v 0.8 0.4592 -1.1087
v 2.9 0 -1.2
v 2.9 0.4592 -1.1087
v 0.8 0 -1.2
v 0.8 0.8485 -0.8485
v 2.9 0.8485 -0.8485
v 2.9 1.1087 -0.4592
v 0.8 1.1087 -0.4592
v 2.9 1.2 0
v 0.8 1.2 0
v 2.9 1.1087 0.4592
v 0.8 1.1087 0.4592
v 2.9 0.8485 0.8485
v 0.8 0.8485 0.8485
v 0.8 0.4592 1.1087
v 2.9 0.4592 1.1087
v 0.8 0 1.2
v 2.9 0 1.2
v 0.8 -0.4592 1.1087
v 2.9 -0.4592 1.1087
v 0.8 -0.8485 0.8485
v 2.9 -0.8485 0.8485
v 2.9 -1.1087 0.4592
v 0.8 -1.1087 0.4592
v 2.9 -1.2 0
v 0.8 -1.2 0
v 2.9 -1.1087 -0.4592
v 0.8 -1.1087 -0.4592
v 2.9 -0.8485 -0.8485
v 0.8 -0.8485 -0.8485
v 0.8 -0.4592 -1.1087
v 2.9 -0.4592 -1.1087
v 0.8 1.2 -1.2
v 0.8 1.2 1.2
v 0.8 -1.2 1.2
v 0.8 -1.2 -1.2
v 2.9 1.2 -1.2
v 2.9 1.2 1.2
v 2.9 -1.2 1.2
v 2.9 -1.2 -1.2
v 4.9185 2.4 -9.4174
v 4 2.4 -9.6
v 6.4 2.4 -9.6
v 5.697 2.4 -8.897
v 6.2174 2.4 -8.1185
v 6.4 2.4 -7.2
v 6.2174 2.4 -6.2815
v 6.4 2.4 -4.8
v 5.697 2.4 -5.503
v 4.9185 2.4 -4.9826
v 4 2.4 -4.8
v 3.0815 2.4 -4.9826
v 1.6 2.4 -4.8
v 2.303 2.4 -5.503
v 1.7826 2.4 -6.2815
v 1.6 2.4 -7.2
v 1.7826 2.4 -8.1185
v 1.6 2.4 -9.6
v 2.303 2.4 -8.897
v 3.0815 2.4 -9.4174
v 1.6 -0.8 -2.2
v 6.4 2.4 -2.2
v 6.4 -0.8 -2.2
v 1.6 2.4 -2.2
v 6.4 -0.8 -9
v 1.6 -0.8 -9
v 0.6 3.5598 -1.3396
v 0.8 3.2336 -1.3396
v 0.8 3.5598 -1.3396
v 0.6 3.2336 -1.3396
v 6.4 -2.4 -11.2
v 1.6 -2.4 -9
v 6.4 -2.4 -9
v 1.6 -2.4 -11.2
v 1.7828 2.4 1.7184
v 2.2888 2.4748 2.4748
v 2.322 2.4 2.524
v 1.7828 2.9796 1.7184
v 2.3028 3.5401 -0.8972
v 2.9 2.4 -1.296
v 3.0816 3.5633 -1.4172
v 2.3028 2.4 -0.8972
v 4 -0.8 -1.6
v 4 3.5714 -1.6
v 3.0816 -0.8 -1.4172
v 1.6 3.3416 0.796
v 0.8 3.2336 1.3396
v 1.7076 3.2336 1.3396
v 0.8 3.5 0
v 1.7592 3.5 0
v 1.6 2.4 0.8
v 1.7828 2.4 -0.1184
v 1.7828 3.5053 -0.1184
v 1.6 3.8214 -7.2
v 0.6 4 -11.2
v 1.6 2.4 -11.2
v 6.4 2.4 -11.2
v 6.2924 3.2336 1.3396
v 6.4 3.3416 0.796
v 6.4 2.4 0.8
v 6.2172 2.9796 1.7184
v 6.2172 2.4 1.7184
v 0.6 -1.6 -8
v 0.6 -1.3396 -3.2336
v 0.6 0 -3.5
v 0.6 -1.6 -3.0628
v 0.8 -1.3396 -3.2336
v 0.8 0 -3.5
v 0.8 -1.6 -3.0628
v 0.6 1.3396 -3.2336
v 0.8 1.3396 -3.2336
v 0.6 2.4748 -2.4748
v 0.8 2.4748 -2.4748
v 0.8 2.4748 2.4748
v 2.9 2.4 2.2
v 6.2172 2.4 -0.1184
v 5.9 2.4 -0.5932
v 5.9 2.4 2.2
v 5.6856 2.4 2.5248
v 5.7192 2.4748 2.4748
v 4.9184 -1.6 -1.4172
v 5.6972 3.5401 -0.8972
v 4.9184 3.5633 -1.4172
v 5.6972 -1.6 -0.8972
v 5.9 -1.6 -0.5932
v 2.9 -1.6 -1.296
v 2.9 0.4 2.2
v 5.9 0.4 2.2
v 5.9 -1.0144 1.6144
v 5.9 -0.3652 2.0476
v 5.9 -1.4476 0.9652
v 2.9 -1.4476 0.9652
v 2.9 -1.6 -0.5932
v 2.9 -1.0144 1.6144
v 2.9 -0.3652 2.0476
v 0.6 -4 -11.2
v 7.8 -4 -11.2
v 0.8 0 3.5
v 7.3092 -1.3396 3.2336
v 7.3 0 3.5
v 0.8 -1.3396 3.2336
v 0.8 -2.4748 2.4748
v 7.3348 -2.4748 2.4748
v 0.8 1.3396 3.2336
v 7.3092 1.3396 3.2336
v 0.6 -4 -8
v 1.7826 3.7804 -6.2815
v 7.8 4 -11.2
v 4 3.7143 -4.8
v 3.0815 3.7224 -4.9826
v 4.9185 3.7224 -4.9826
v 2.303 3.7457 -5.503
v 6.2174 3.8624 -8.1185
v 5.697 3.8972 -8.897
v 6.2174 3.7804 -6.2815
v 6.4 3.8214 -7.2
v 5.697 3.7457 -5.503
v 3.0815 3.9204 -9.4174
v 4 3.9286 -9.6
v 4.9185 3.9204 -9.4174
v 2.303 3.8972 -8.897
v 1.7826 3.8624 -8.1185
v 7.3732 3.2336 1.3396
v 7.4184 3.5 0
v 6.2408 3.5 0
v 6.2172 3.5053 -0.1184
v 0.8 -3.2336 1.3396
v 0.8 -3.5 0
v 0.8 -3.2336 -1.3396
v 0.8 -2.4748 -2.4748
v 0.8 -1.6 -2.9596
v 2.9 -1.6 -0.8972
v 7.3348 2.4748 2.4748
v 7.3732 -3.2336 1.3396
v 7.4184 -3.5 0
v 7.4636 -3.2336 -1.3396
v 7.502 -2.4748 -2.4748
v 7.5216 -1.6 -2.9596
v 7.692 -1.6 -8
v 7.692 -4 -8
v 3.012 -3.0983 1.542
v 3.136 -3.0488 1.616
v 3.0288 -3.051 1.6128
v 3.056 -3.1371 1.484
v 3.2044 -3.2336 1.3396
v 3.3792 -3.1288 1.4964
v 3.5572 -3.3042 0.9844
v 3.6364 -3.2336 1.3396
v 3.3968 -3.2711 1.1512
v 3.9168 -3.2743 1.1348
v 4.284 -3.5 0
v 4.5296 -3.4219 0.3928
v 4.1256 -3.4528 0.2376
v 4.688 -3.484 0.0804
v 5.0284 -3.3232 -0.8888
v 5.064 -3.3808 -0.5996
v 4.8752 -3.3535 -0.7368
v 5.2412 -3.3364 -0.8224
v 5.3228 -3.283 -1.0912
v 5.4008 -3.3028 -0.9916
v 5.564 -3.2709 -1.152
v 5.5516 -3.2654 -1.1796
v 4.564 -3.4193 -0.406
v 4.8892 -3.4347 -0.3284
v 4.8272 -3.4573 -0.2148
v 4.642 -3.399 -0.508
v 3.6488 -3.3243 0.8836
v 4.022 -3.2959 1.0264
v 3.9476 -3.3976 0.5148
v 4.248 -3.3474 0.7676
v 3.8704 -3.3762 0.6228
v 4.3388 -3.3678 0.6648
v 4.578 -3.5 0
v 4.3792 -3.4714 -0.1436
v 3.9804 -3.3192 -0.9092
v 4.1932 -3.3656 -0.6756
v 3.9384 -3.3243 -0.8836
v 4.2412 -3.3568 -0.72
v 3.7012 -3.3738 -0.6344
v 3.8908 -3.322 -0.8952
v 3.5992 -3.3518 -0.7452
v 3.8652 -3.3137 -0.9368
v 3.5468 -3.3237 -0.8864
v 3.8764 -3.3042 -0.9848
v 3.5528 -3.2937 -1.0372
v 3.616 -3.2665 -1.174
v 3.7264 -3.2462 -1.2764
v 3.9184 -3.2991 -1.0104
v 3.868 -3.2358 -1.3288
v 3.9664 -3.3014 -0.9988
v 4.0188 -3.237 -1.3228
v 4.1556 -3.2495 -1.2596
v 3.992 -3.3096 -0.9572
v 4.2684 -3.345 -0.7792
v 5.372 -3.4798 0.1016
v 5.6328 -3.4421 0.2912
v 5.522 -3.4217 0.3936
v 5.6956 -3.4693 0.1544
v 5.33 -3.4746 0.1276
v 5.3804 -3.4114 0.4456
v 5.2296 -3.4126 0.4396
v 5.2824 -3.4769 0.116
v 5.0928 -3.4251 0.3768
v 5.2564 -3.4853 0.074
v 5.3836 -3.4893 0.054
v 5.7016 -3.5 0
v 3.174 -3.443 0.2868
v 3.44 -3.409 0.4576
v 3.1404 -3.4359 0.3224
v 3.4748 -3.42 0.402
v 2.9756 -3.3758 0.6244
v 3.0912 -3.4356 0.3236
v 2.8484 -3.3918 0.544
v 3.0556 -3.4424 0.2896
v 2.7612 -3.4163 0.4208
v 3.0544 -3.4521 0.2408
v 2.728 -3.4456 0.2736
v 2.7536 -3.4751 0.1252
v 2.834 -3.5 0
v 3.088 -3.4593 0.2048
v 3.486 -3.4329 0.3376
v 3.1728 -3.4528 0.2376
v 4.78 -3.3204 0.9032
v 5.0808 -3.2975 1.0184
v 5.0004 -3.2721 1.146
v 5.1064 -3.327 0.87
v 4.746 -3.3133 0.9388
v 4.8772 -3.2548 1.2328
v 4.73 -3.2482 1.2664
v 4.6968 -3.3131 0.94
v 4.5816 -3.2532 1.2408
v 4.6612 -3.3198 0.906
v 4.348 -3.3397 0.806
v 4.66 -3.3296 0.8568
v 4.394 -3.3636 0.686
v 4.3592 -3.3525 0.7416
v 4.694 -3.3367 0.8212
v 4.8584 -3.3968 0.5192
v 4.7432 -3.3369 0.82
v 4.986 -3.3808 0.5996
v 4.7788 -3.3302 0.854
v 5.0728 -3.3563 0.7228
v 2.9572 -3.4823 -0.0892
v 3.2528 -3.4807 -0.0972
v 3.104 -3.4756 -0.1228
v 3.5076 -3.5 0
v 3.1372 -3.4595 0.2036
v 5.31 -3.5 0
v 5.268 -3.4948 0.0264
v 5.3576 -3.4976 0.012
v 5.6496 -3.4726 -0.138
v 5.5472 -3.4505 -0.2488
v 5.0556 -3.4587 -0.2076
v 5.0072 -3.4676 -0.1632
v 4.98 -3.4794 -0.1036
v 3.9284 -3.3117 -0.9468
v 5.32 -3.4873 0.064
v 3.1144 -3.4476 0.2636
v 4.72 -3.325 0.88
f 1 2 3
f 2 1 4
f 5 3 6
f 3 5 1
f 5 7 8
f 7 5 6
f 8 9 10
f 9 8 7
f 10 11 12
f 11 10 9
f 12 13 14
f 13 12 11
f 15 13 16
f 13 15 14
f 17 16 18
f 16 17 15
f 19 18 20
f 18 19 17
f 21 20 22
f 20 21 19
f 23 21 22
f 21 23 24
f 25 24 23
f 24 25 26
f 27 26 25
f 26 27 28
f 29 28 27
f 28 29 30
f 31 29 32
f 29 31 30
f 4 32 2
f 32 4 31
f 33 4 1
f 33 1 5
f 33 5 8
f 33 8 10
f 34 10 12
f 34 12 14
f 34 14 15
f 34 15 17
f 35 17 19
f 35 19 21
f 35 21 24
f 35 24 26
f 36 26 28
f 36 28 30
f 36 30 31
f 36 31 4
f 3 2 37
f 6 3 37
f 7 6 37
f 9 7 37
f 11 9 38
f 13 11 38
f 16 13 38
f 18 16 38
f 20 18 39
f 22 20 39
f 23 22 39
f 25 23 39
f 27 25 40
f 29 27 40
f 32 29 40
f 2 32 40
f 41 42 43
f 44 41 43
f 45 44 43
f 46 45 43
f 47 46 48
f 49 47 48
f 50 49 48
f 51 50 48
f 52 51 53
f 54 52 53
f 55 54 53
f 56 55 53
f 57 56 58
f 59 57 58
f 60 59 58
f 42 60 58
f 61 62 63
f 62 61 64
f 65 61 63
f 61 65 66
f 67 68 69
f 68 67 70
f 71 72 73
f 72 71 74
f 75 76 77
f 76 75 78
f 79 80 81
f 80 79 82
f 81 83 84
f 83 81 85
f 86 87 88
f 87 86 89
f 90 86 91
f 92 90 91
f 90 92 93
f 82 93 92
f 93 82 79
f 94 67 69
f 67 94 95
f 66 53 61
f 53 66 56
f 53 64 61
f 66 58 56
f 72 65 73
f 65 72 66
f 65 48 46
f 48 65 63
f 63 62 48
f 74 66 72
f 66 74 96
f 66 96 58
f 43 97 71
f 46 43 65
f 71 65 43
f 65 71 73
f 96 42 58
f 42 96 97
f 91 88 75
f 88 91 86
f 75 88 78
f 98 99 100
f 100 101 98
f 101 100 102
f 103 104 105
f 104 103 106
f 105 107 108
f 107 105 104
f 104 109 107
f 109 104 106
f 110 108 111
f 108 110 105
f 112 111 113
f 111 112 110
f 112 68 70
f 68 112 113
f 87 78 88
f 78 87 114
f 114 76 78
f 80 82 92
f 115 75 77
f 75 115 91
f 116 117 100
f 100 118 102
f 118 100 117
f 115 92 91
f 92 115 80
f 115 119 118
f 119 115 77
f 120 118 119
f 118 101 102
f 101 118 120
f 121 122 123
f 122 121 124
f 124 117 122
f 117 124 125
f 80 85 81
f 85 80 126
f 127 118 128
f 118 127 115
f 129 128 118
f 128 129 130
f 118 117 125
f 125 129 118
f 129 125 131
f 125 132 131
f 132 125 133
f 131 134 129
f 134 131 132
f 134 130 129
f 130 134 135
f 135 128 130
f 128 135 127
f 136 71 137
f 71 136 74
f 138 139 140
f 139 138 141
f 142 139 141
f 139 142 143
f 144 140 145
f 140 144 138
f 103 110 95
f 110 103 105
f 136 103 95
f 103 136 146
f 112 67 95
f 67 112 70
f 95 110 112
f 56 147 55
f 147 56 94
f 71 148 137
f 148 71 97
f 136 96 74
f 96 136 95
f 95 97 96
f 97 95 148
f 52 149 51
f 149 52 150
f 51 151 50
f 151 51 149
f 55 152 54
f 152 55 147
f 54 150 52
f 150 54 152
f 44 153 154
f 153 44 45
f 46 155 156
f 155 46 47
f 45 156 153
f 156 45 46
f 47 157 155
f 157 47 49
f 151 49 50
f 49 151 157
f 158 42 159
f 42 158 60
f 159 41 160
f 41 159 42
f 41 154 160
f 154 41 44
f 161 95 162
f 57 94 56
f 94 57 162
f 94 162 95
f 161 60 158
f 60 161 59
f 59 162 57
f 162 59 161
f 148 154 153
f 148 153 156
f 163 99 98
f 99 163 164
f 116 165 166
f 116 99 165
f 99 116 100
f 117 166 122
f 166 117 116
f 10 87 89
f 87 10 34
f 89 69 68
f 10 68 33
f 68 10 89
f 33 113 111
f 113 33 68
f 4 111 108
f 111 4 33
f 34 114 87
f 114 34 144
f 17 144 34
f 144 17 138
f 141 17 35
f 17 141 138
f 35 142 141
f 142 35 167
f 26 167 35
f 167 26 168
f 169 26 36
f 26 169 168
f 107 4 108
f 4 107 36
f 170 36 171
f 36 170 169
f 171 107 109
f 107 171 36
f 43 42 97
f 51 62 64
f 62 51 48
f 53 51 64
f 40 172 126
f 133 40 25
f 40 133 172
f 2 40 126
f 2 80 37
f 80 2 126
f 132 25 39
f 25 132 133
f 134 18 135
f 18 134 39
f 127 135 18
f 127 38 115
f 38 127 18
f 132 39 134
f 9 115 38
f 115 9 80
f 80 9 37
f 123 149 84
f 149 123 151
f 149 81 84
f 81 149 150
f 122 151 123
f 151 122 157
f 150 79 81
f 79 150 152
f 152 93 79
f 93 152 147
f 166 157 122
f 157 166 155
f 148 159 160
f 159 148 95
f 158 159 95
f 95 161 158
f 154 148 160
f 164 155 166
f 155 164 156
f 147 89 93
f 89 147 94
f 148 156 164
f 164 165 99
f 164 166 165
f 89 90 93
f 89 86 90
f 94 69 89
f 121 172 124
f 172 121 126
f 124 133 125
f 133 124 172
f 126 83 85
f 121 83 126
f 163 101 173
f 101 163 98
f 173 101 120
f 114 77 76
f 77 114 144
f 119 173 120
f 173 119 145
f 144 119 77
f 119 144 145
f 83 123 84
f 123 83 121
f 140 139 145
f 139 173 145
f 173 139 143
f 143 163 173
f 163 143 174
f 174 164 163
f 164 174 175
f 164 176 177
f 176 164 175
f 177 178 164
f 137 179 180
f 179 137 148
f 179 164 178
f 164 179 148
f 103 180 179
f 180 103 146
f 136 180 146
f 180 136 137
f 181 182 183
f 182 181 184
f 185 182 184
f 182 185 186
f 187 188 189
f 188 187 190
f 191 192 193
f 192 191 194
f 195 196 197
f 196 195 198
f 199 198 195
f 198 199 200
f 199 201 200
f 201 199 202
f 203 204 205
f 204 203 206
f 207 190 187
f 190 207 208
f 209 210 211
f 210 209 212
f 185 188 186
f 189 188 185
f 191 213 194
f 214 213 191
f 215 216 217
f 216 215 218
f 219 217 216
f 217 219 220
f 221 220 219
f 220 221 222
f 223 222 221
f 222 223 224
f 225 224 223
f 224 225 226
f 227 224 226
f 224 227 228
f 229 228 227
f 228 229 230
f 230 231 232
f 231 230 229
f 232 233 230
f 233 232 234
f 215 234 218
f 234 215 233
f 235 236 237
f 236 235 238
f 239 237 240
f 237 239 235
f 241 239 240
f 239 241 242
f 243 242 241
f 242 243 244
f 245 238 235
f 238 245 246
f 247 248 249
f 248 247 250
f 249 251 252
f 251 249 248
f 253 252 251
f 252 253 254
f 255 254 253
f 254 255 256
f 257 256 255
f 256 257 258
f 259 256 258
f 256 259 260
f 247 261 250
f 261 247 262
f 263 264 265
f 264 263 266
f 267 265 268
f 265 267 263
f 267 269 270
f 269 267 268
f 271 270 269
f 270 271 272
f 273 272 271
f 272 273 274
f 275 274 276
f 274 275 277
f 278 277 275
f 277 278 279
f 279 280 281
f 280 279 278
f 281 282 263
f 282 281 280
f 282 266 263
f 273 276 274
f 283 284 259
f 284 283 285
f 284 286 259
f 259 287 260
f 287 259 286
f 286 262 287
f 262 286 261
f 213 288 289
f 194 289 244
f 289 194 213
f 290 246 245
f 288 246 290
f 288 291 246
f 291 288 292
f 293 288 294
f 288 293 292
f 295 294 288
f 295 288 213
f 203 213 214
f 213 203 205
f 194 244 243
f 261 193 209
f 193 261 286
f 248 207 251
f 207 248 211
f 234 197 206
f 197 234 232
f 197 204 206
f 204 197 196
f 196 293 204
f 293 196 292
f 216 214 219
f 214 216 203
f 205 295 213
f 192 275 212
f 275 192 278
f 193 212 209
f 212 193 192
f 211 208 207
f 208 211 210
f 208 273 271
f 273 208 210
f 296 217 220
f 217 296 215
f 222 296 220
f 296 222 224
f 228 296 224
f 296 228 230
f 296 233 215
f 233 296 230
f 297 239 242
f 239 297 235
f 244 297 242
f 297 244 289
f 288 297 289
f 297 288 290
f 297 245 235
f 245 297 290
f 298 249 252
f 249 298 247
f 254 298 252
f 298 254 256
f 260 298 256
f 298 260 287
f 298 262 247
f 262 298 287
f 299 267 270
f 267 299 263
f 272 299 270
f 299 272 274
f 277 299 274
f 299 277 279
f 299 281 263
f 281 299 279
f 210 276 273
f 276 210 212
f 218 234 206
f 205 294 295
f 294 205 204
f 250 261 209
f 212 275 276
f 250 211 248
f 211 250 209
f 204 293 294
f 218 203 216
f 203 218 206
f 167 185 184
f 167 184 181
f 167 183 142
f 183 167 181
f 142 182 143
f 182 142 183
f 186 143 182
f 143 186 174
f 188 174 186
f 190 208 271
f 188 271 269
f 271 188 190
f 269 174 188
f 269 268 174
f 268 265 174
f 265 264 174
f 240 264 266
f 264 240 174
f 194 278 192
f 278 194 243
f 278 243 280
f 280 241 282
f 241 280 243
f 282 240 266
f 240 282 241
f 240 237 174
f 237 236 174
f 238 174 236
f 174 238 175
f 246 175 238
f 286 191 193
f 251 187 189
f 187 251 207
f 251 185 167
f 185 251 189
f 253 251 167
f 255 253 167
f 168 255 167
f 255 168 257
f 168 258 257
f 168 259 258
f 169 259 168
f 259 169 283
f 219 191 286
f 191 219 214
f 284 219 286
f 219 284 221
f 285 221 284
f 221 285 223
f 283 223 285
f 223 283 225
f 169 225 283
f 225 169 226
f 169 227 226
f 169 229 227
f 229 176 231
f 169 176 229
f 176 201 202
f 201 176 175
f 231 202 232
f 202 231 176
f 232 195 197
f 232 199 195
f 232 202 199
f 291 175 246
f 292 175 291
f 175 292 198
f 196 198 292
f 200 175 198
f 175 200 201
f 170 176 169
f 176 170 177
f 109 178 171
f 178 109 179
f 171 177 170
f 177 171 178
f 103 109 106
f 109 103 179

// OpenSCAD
use <../lib.scad>
use <s/3817bs01.scad>
function ldraw_lib__3817bpc44() = [
// 0 ~Minifig Leg Left with  2 Safety Pins Pattern (Obsolete)
// 0 Name: 3817bpc44.dat
// 0 Author: Magnus Forsberg [MagFors]
// 0 !LDRAW_ORG Part UPDATE 2023-03
// 0 !LICENSE Licensed under CC BY 4.0 : see CAreadme.txt
// 
// 0 BFC CERTIFY CCW
  [0,"BFC","CERTIFY"],
  [0,"BFC","CCW"],
// 
// 0 !KEYWORDS bricklink 970c00pb0099, CMF, Punk Rocker, Rock Band Drummer
// 0 !KEYWORDS Series 4, set 850486
// 
// 0 !HISTORY 2013-12-23 [MagFors] Original design as 3817pc44
// 0 !HISTORY 2020-06-14 [MagFors] Adapted to corrected geometry
// 0 !HISTORY 2020-12-29 [PTadmin] Official Update 2020-03
// 0 !HISTORY 2023-06-03 [Holly-Wood] Obsoleted due to bad geometry
// 0 !HISTORY 2023-06-24 [OrionP] Official Update 2023-03
// 
// 
// 1 16 0 0 0 1 0 0 0 1 0 0 0 1 s\3817bs01.dat
  [1,16,0,0,0,1,0,0,0,1,0,0,0,1, ldraw_lib__s__3817bs01()],
// 4 16 1.5 20 -4 1.5 20 -10 19.23 20 -10 19.23 20 -4
  [4,16,1.5,20,-4,1.5,20,-10,19.23,20,-10,19.23,20,-4],
// 4 16 1.5 20 -10 1.5 28 -10 19.5 28 -10 19.23 20 -10
  [4,16,1.5,20,-10,1.5,28,-10,19.5,28,-10,19.23,20,-10],
// 5 24 2 3.349 -8.084 18.659 3.349 -8.084 2 0 -8.75 2 6.187 -6.187
  [5,24,2,3.349,-8.084,18.659,3.349,-8.084,2,0,-8.75,2,6.187,-6.187],
// 5 24 2 6.187 -6.187 18.755 6.187 -6.187 2 7.399 -4 2 3.349 -8.084
  [5,24,2,6.187,-6.187,18.755,6.187,-6.187,2,7.399,-4,2,3.349,-8.084],
// 5 24 2 0 -8.75 18.546 0 -8.75 2 3.349 -8.084 2 -3.349 -8.084
  [5,24,2,0,-8.75,18.546,0,-8.75,2,3.349,-8.084,2,-3.349,-8.084],
// 5 24 2 -3.349 -8.084 18.433 -3.349 -8.084 2 0 -8.75 2 -6.187 -6.187
  [5,24,2,-3.349,-8.084,18.433,-3.349,-8.084,2,0,-8.75,2,-6.187,-6.187],
// 
// 4 0 7.84 -4.04 -7.6221 7.572 -4.032 -7.6275 7.53 -3.855 -7.7458 7.64 -3.71 -7.8427
  [4,0,7.84,-4.04,-7.6221,7.572,-4.032,-7.6275,7.53,-3.855,-7.7458,7.64,-3.71,-7.8427],
// 4 0 7.64 -3.71 -7.8427 8.011 -3.349 -8.084 8.448 -3.741 -7.822 7.84 -4.04 -7.6221
  [4,0,7.64,-3.71,-7.8427,8.011,-3.349,-8.084,8.448,-3.741,-7.822,7.84,-4.04,-7.6221],
// 4 0 9.792 -2.837 -8.1858 9.091 -3.349 -8.084 8.492 -2.878 -8.1777 8.893 -2.461 -8.2606
  [4,0,9.792,-2.837,-8.1858,9.091,-3.349,-8.084,8.492,-2.878,-8.1777,8.893,-2.461,-8.2606],
// 4 0 11.72 -0.201 -8.71 11.324 -0.982 -8.5547 10.314 -0.594 -8.6319 10.71 0 -8.75
  [4,0,11.72,-0.201,-8.71,11.324,-0.982,-8.5547,10.314,-0.594,-8.6319,10.71,0,-8.75],
// 4 0 13.103 2.056 -8.3411 12.66 1.499 -8.4519 12.188 1.842 -8.3837 12.571 2.222 -8.3081
  [4,0,13.103,2.056,-8.3411,12.66,1.499,-8.4519,12.188,1.842,-8.3837,12.571,2.222,-8.3081],
// 4 0 13.502 2.479 -8.257 13.103 2.056 -8.3411 12.571 2.222 -8.3081 13.307 2.728 -8.2075
  [4,0,13.502,2.479,-8.257,13.103,2.056,-8.3411,12.571,2.222,-8.3081,13.307,2.728,-8.2075],
// 4 0 13.502 2.479 -8.257 13.307 2.728 -8.2075 13.879 2.949 -8.1635 13.91 2.88 -8.1773
  [4,0,13.502,2.479,-8.257,13.307,2.728,-8.2075,13.879,2.949,-8.1635,13.91,2.88,-8.1773],
// 4 0 11.41 1.015 -8.5482 11.605 1.27 -8.4974 12.223 0.821 -8.5867 12.068 0.537 -8.6432
  [4,0,11.41,1.015,-8.5482,11.605,1.27,-8.4974,12.223,0.821,-8.5867,12.068,0.537,-8.6432],
// 4 0 10.055 -2.566 -8.2397 9.792 -2.837 -8.1858 8.893 -2.461 -8.2606 9.122 -2.209 -8.3107
  [4,0,10.055,-2.566,-8.2397,9.792,-2.837,-8.1858,8.893,-2.461,-8.2606,9.122,-2.209,-8.3107],
// 4 0 9.869 -1.287 -8.4941 10.847 -1.662 -8.4195 10.62 -1.919 -8.3684 9.676 -1.557 -8.4404
  [4,0,9.869,-1.287,-8.4941,10.847,-1.662,-8.4195,10.62,-1.919,-8.3684,9.676,-1.557,-8.4404],
// 3 0 8.011 -3.349 -8.084 9.091 -3.349 -8.084 8.448 -3.741 -7.822
  [3,0,8.011,-3.349,-8.084,9.091,-3.349,-8.084,8.448,-3.741,-7.822],
// 3 0 8.492 -2.878 -8.1777 9.091 -3.349 -8.084 8.011 -3.349 -8.084
  [3,0,8.492,-2.878,-8.1777,9.091,-3.349,-8.084,8.011,-3.349,-8.084],
// 3 0 10.71 0 -8.75 11.445 0 -8.75 11.72 -0.201 -8.71
  [3,0,10.71,0,-8.75,11.445,0,-8.75,11.72,-0.201,-8.71],
// 3 0 10.948 0.359 -8.6786 11.445 0 -8.75 10.71 0 -8.75
  [3,0,10.948,0.359,-8.6786,11.445,0,-8.75,10.71,0,-8.75],
// 4 80 10.603 1.8 -8.392 10.483 1.689 -8.4141 9.846 2.209 -8.3107 9.951 2.273 -8.298
  [4,80,10.603,1.8,-8.392,10.483,1.689,-8.4141,9.846,2.209,-8.3107,9.951,2.273,-8.298],
// 4 80 9.253 1.586 -8.4346 9.727 2.238 -8.3049 9.846 2.209 -8.3107 10.483 1.689 -8.4141
  [4,80,9.253,1.586,-8.4346,9.727,2.238,-8.3049,9.846,2.209,-8.3107,10.483,1.689,-8.4141],
// 4 80 9.663 2.342 -8.2843 9.727 2.238 -8.3049 9.253 1.586 -8.4346 8.998 1.863 -8.3795
  [4,80,9.663,2.342,-8.2843,9.727,2.238,-8.3049,9.253,1.586,-8.4346,8.998,1.863,-8.3795],
// 4 80 9.691 2.462 -8.2604 9.663 2.342 -8.2843 8.998 1.863 -8.3795 8.867 2.216 -8.3093
  [4,80,9.691,2.462,-8.2604,9.663,2.342,-8.2843,8.998,1.863,-8.3795,8.867,2.216,-8.3093],
// 4 80 9.04 2.935 -8.1663 9.691 2.462 -8.2604 8.867 2.216 -8.3093 8.882 2.593 -8.2343
  [4,80,9.04,2.935,-8.1663,9.691,2.462,-8.2604,8.867,2.216,-8.3093,8.882,2.593,-8.2343],
// 4 80 9.796 2.526 -8.2477 9.691 2.462 -8.2604 9.04 2.935 -8.1663 9.316 3.191 -8.1154
  [4,80,9.796,2.526,-8.2477,9.691,2.462,-8.2604,9.04,2.935,-8.1663,9.316,3.191,-8.1154],
// 4 80 9.916 2.497 -8.2534 9.796 2.526 -8.2477 9.316 3.191 -8.1154 9.67 3.322 -8.0894
  [4,80,9.916,2.497,-8.2534,9.796,2.526,-8.2477,9.316,3.191,-8.1154,9.67,3.322,-8.0894],
// 4 80 10.389 3.149 -8.1238 9.916 2.497 -8.2534 9.67 3.322 -8.0894 10.047 3.307 -8.0924
  [4,80,10.389,3.149,-8.1238,9.916,2.497,-8.2534,9.67,3.322,-8.0894,10.047,3.307,-8.0924],
// 4 80 10.671 1.948 -8.3626 9.98 2.393 -8.2741 9.916 2.497 -8.2534 10.389 3.149 -8.1238
  [4,80,10.671,1.948,-8.3626,9.98,2.393,-8.2741,9.916,2.497,-8.2534,10.389,3.149,-8.1238],
// 4 80 10.603 1.8 -8.392 9.951 2.273 -8.298 9.98 2.393 -8.2741 10.671 1.948 -8.3626
  [4,80,10.603,1.8,-8.392,9.951,2.273,-8.298,9.98,2.393,-8.2741,10.671,1.948,-8.3626],
// 4 80 13.805 -0.984 -8.5543 13.43 -0.254 -8.6995 14.239 -0.386 -8.6732 14.082 -0.728 -8.6052
  [4,80,13.805,-0.984,-8.5543,13.43,-0.254,-8.6995,14.239,-0.386,-8.6732,14.082,-0.728,-8.6052],
// 4 80 13.451 -1.114 -8.5285 13.325 -0.319 -8.6866 13.43 -0.254 -8.6995 13.805 -0.984 -8.5543
  [4,80,13.451,-1.114,-8.5285,13.325,-0.319,-8.6866,13.43,-0.254,-8.6995,13.805,-0.984,-8.5543],
// 4 80 13.074 -1.099 -8.5314 13.206 -0.29 -8.6923 13.325 -0.319 -8.6866 13.451 -1.114 -8.5285
  [4,80,13.074,-1.099,-8.5314,13.206,-0.29,-8.6923,13.325,-0.319,-8.6866,13.451,-1.114,-8.5285],
// 4 80 13.141 -0.185 -8.7132 13.206 -0.29 -8.6923 13.074 -1.099 -8.5314 12.732 -0.942 -8.5627
  [4,80,13.141,-0.185,-8.7132,13.206,-0.29,-8.6923,13.074,-1.099,-8.5314,12.732,-0.942,-8.5627],
// 4 80 14.239 -0.386 -8.6732 13.43 -0.254 -8.6995 13.459 -0.135 -8.7232 14.254 0 -8.75
  [4,80,14.239,-0.386,-8.6732,13.43,-0.254,-8.6995,13.459,-0.135,-8.7232,14.254,0,-8.75],
// 4 80 8.687 -1.005 -8.5501 8.6 -1.144 -8.5225 7.851 -0.806 -8.5897 7.935 -0.717 -8.6074
  [4,80,8.687,-1.005,-8.5501,8.6,-1.144,-8.5225,7.851,-0.806,-8.5897,7.935,-0.717,-8.6074],
// 4 80 7.439 -1.561 -8.4396 7.728 -0.809 -8.5891 7.851 -0.806 -8.5897 8.6 -1.144 -8.5225
  [4,80,7.439,-1.561,-8.4396,7.728,-0.809,-8.5891,7.851,-0.806,-8.5897,8.6,-1.144,-8.5225],
// 4 80 7.639 -0.724 -8.606 7.728 -0.809 -8.5891 7.439 -1.561 -8.4396 7.121 -1.36 -8.4795
  [4,80,7.639,-0.724,-8.606,7.728,-0.809,-8.5891,7.439,-1.561,-8.4396,7.121,-1.36,-8.4795],
// 4 80 7.636 -0.602 -8.6303 7.639 -0.724 -8.606 7.121 -1.36 -8.4795 6.903 -1.052 -8.5408
  [4,80,7.636,-0.602,-8.6303,7.639,-0.724,-8.606,7.121,-1.36,-8.4795,6.903,-1.052,-8.5408],
// 4 80 6.884 -0.313 -8.6878 7.636 -0.602 -8.6303 6.903 -1.052 -8.5408 6.82 -0.684 -8.614
  [4,80,6.884,-0.313,-8.6878,7.636,-0.602,-8.6303,6.903,-1.052,-8.5408,6.82,-0.684,-8.614],
// 4 80 7.72 -0.512 -8.6482 7.636 -0.602 -8.6303 6.884 -0.313 -8.6878 7.085 0 -8.75
  [4,80,7.72,-0.512,-8.6482,7.636,-0.602,-8.6303,6.884,-0.313,-8.6878,7.085,0,-8.75],
// 4 80 8.687 -1.005 -8.5501 7.935 -0.717 -8.6074 7.932 -0.594 -8.6319 8.715 -0.844 -8.5822
  [4,80,8.687,-1.005,-8.5501,7.935,-0.717,-8.6074,7.932,-0.594,-8.6319,8.715,-0.844,-8.5822],
// 4 80 12.501 -2.865 -8.1803 11.95 -2.258 -8.301 12.766 -2.175 -8.3175 12.702 -2.546 -8.2437
  [4,80,12.501,-2.865,-8.1803,11.95,-2.258,-8.301,12.766,-2.175,-8.3175,12.702,-2.546,-8.2437],
// 4 80 12.193 -3.082 -8.1371 11.865 -2.347 -8.2833 11.95 -2.258 -8.301 12.501 -2.865 -8.1803
  [4,80,12.193,-3.082,-8.1371,11.865,-2.347,-8.2833,11.95,-2.258,-8.301,12.501,-2.865,-8.1803],
// 4 80 11.825 -3.166 -8.1204 11.742 -2.35 -8.2827 11.865 -2.347 -8.2833 12.193 -3.082 -8.1371
  [4,80,11.825,-3.166,-8.1204,11.742,-2.35,-8.2827,11.865,-2.347,-8.2833,12.193,-3.082,-8.1371],
// 4 80 11.653 -2.265 -8.2996 11.742 -2.35 -8.2827 11.825 -3.166 -8.1204 11.454 -3.102 -8.1331
  [4,80,11.653,-2.265,-8.2996,11.742,-2.35,-8.2827,11.825,-3.166,-8.1204,11.454,-3.102,-8.1331],
// 4 80 11.65 -2.142 -8.324 11.653 -2.265 -8.2996 11.454 -3.102 -8.1331 10.87 -2.015 -8.3493
  [4,80,11.65,-2.142,-8.324,11.653,-2.265,-8.2996,11.454,-3.102,-8.1331,10.87,-2.015,-8.3493],
// 4 80 10.898 -1.854 -8.3813 10.985 -1.715 -8.4089 11.735 -2.053 -8.3417 11.65 -2.142 -8.324
  [4,80,10.898,-1.854,-8.3813,10.985,-1.715,-8.4089,11.735,-2.053,-8.3417,11.65,-2.142,-8.324],
// 4 80 12.146 -1.298 -8.4919 11.858 -2.05 -8.3423 11.735 -2.053 -8.3417 10.985 -1.715 -8.4089
  [4,80,12.146,-1.298,-8.4919,11.858,-2.05,-8.3423,11.735,-2.053,-8.3417,10.985,-1.715,-8.4089],
// 4 80 11.947 -2.135 -8.3254 11.858 -2.05 -8.3423 12.146 -1.298 -8.4919 12.465 -1.499 -8.4519
  [4,80,11.947,-2.135,-8.3254,11.858,-2.05,-8.3423,12.146,-1.298,-8.4919,12.465,-1.499,-8.4519],
// 4 80 11.95 -2.258 -8.301 11.947 -2.135 -8.3254 12.465 -1.499 -8.4519 12.682 -1.807 -8.3907
  [4,80,11.95,-2.258,-8.301,11.947,-2.135,-8.3254,12.465,-1.499,-8.4519,12.682,-1.807,-8.3907],
// 3 80 12.682 -1.807 -8.3907 12.766 -2.175 -8.3175 11.95 -2.258 -8.301
  [3,80,12.682,-1.807,-8.3907,12.766,-2.175,-8.3175,11.95,-2.258,-8.301],
// 3 80 10.87 -2.015 -8.3493 10.898 -1.854 -8.3813 11.65 -2.142 -8.324
  [3,80,10.87,-2.015,-8.3493,10.898,-1.854,-8.3813,11.65,-2.142,-8.324],
// 4 80 8.132 0.243 -8.7017 7.085 0 -8.75 7.393 0.223 -8.7057 7.76 0.307 -8.6889
  [4,80,8.132,0.243,-8.7017,7.085,0,-8.75,7.393,0.223,-8.7057,7.76,0.307,-8.6889],
// 3 80 8.132 0.243 -8.7017 8.769 0 -8.75 7.085 0 -8.75
  [3,80,8.132,0.243,-8.7017,8.769,0,-8.75,7.085,0,-8.75],
// 4 80 8.769 0 -8.75 7.843 -0.509 -8.6488 7.72 -0.512 -8.6482 7.085 0 -8.75
  [4,80,8.769,0,-8.75,7.843,-0.509,-8.6488,7.72,-0.512,-8.6482,7.085,0,-8.75],
// 4 80 8.715 -0.844 -8.5822 7.932 -0.594 -8.6319 7.843 -0.509 -8.6488 8.769 0 -8.75
  [4,80,8.715,-0.844,-8.5822,7.932,-0.594,-8.6319,7.843,-0.509,-8.6488,8.769,0,-8.75],
// 3 80 11.445 0 -8.75 13.275 0 -8.75 13.17 -0.066 -8.7369
  [3,80,11.445,0,-8.75,13.275,0,-8.75,13.17,-0.066,-8.7369],
// 4 80 11.72 -0.201 -8.71 11.445 0 -8.75 13.17 -0.066 -8.7369 13.141 -0.185 -8.7132
  [4,80,11.72,-0.201,-8.71,11.445,0,-8.75,13.17,-0.066,-8.7369,13.141,-0.185,-8.7132],
// 3 80 13.394 -0.03 -8.744 14.254 0 -8.75 13.459 -0.135 -8.7232
  [3,80,13.394,-0.03,-8.744,14.254,0,-8.75,13.459,-0.135,-8.7232],
// 3 80 13.275 0 -8.75 14.254 0 -8.75 13.394 -0.03 -8.744
  [3,80,13.275,0,-8.75,14.254,0,-8.75,13.394,-0.03,-8.744],
// 4 80 13.868 0.622 -8.6263 14.124 0.345 -8.6814 14.254 0 -8.75 13.275 0 -8.75
  [4,80,13.868,0.622,-8.6263,14.124,0.345,-8.6814,14.254,0,-8.75,13.275,0,-8.75],
// 4 80 12.518 0.408 -8.6689 12.639 0.519 -8.6468 13.868 0.622 -8.6263 13.275 0 -8.75
  [4,80,12.518,0.408,-8.6689,12.639,0.519,-8.6468,13.868,0.622,-8.6263,13.275,0,-8.75],
// 3 80 12.45 0.259 -8.6985 12.518 0.408 -8.6689 13.275 0 -8.75
  [3,80,12.45,0.259,-8.6985,12.518,0.408,-8.6689,13.275,0,-8.75],
// 3 80 12.45 0.259 -8.6985 13.275 0 -8.75 11.445 0 -8.75
  [3,80,12.45,0.259,-8.6985,13.275,0,-8.75,11.445,0,-8.75],
// 4 80 11.41 1.015 -8.5482 12.068 0.537 -8.6432 11.445 0 -8.75 10.948 0.359 -8.6786
  [4,80,11.41,1.015,-8.5482,12.068,0.537,-8.6432,11.445,0,-8.75,10.948,0.359,-8.6786],
// 3 80 11.72 -0.201 -8.71 13.141 -0.185 -8.7132 12.732 -0.942 -8.5627
  [3,80,11.72,-0.201,-8.71,13.141,-0.185,-8.7132,12.732,-0.942,-8.5627],
// 4 80 8.769 0 -8.75 10.314 -0.594 -8.6319 9.869 -1.287 -8.4941 8.715 -0.844 -8.5822
  [4,80,8.769,0,-8.75,10.314,-0.594,-8.6319,9.869,-1.287,-8.4941,8.715,-0.844,-8.5822],
// 4 80 8.6 -1.144 -8.5225 9.676 -1.557 -8.4404 9.122 -2.209 -8.3107 7.439 -1.561 -8.4396
  [4,80,8.6,-1.144,-8.5225,9.676,-1.557,-8.4404,9.122,-2.209,-8.3107,7.439,-1.561,-8.4396],
// 4 80 11.605 1.27 -8.4974 10.671 1.948 -8.3626 10.389 3.149 -8.1238 12.188 1.842 -8.3837
  [4,80,11.605,1.27,-8.4974,10.671,1.948,-8.3626,10.389,3.149,-8.1238,12.188,1.842,-8.3837],
// 4 80 12.223 0.821 -8.5867 11.605 1.27 -8.4974 12.188 1.842 -8.3837 12.66 1.499 -8.4519
  [4,80,12.223,0.821,-8.5867,11.605,1.27,-8.4974,12.188,1.842,-8.3837,12.66,1.499,-8.4519],
// 4 80 12.66 1.499 -8.4519 13.868 0.622 -8.6263 12.639 0.519 -8.6468 12.223 0.821 -8.5867
  [4,80,12.66,1.499,-8.4519,13.868,0.622,-8.6263,12.639,0.519,-8.6468,12.223,0.821,-8.5867],
// 4 80 10.483 1.689 -8.4141 11.41 1.015 -8.5482 10.948 0.359 -8.6786 9.253 1.586 -8.4346
  [4,80,10.483,1.689,-8.4141,11.41,1.015,-8.5482,10.948,0.359,-8.6786,9.253,1.586,-8.4346],
// 3 80 12.068 0.537 -8.6432 12.45 0.259 -8.6985 11.445 0 -8.75
  [3,80,12.068,0.537,-8.6432,12.45,0.259,-8.6985,11.445,0,-8.75],
// 4 80 11.324 -0.982 -8.5547 12.146 -1.298 -8.4919 10.985 -1.715 -8.4089 10.847 -1.662 -8.4195
  [4,80,11.324,-0.982,-8.5547,12.146,-1.298,-8.4919,10.985,-1.715,-8.4089,10.847,-1.662,-8.4195],
// 4 80 10.314 -0.594 -8.6319 11.324 -0.982 -8.5547 10.847 -1.662 -8.4195 9.869 -1.287 -8.4941
  [4,80,10.314,-0.594,-8.6319,11.324,-0.982,-8.5547,10.847,-1.662,-8.4195,9.869,-1.287,-8.4941],
// 4 80 10.055 -2.566 -8.2397 9.122 -2.209 -8.3107 9.676 -1.557 -8.4404 10.62 -1.919 -8.3684
  [4,80,10.055,-2.566,-8.2397,9.122,-2.209,-8.3107,9.676,-1.557,-8.4404,10.62,-1.919,-8.3684],
// 4 80 10.62 -1.919 -8.3684 10.87 -2.015 -8.3493 11.454 -3.102 -8.1331 10.055 -2.566 -8.2397
  [4,80,10.62,-1.919,-8.3684,10.87,-2.015,-8.3493,11.454,-3.102,-8.1331,10.055,-2.566,-8.2397],
// 4 16 9.727 2.238 -8.3049 9.821 2.367 -8.2793 9.951 2.273 -8.298 9.846 2.209 -8.3107
  [4,16,9.727,2.238,-8.3049,9.821,2.367,-8.2793,9.951,2.273,-8.298,9.846,2.209,-8.3107],
// 4 16 9.691 2.462 -8.2604 9.821 2.367 -8.2793 9.727 2.238 -8.3049 9.663 2.342 -8.2843
  [4,16,9.691,2.462,-8.2604,9.821,2.367,-8.2793,9.727,2.238,-8.3049,9.663,2.342,-8.2843],
// 4 16 9.916 2.497 -8.2534 9.821 2.367 -8.2793 9.691 2.462 -8.2604 9.796 2.526 -8.2477
  [4,16,9.916,2.497,-8.2534,9.821,2.367,-8.2793,9.691,2.462,-8.2604,9.796,2.526,-8.2477],
// 4 16 9.951 2.273 -8.298 9.821 2.367 -8.2793 9.916 2.497 -8.2534 9.98 2.393 -8.2741
  [4,16,9.951,2.273,-8.298,9.821,2.367,-8.2793,9.916,2.497,-8.2534,9.98,2.393,-8.2741],
// 4 16 13.206 -0.29 -8.6923 13.3 -0.16 -8.7182 13.43 -0.254 -8.6995 13.325 -0.319 -8.6866
  [4,16,13.206,-0.29,-8.6923,13.3,-0.16,-8.7182,13.43,-0.254,-8.6995,13.325,-0.319,-8.6866],
// 4 16 13.17 -0.066 -8.7369 13.3 -0.16 -8.7182 13.206 -0.29 -8.6923 13.141 -0.185 -8.7132
  [4,16,13.17,-0.066,-8.7369,13.3,-0.16,-8.7182,13.206,-0.29,-8.6923,13.141,-0.185,-8.7132],
// 4 16 13.394 -0.03 -8.744 13.3 -0.16 -8.7182 13.17 -0.066 -8.7369 13.275 0 -8.75
  [4,16,13.394,-0.03,-8.744,13.3,-0.16,-8.7182,13.17,-0.066,-8.7369,13.275,0,-8.75],
// 4 16 13.43 -0.254 -8.6995 13.3 -0.16 -8.7182 13.394 -0.03 -8.744 13.459 -0.135 -8.7232
  [4,16,13.43,-0.254,-8.6995,13.3,-0.16,-8.7182,13.394,-0.03,-8.744,13.459,-0.135,-8.7232],
// 4 16 7.728 -0.809 -8.5891 7.786 -0.659 -8.6189 7.935 -0.717 -8.6074 7.851 -0.806 -8.5897
  [4,16,7.728,-0.809,-8.5891,7.786,-0.659,-8.6189,7.935,-0.717,-8.6074,7.851,-0.806,-8.5897],
// 4 16 7.636 -0.602 -8.6303 7.786 -0.659 -8.6189 7.728 -0.809 -8.5891 7.639 -0.724 -8.606
  [4,16,7.636,-0.602,-8.6303,7.786,-0.659,-8.6189,7.728,-0.809,-8.5891,7.639,-0.724,-8.606],
// 4 16 7.843 -0.509 -8.6488 7.786 -0.659 -8.6189 7.636 -0.602 -8.6303 7.72 -0.512 -8.6482
  [4,16,7.843,-0.509,-8.6488,7.786,-0.659,-8.6189,7.636,-0.602,-8.6303,7.72,-0.512,-8.6482],
// 4 16 7.935 -0.717 -8.6074 7.786 -0.659 -8.6189 7.843 -0.509 -8.6488 7.932 -0.594 -8.6319
  [4,16,7.935,-0.717,-8.6074,7.786,-0.659,-8.6189,7.843,-0.509,-8.6488,7.932,-0.594,-8.6319],
// 4 16 11.742 -2.35 -8.2827 11.8 -2.2 -8.3125 11.95 -2.258 -8.301 11.865 -2.347 -8.2833
  [4,16,11.742,-2.35,-8.2827,11.8,-2.2,-8.3125,11.95,-2.258,-8.301,11.865,-2.347,-8.2833],
// 4 16 11.65 -2.142 -8.324 11.8 -2.2 -8.3125 11.742 -2.35 -8.2827 11.653 -2.265 -8.2996
  [4,16,11.65,-2.142,-8.324,11.8,-2.2,-8.3125,11.742,-2.35,-8.2827,11.653,-2.265,-8.2996],
// 4 16 11.858 -2.05 -8.3423 11.8 -2.2 -8.3125 11.65 -2.142 -8.324 11.735 -2.053 -8.3417
  [4,16,11.858,-2.05,-8.3423,11.8,-2.2,-8.3125,11.65,-2.142,-8.324,11.735,-2.053,-8.3417],
// 4 16 11.95 -2.258 -8.301 11.8 -2.2 -8.3125 11.858 -2.05 -8.3423 11.947 -2.135 -8.3254
  [4,16,11.95,-2.258,-8.301,11.8,-2.2,-8.3125,11.858,-2.05,-8.3423,11.947,-2.135,-8.3254],
// 4 16 10.847 -1.662 -8.4195 10.898 -1.854 -8.3813 10.87 -2.015 -8.3493 10.62 -1.919 -8.3684
  [4,16,10.847,-1.662,-8.4195,10.898,-1.854,-8.3813,10.87,-2.015,-8.3493,10.62,-1.919,-8.3684],
// 3 16 10.603 1.8 -8.392 10.671 1.948 -8.3626 11.605 1.27 -8.4974
  [3,16,10.603,1.8,-8.392,10.671,1.948,-8.3626,11.605,1.27,-8.4974],
// 4 16 12.223 0.821 -8.5867 12.518 0.408 -8.6689 12.45 0.259 -8.6985 12.068 0.537 -8.6432
  [4,16,12.223,0.821,-8.5867,12.518,0.408,-8.6689,12.45,0.259,-8.6985,12.068,0.537,-8.6432],
// 3 16 8.687 -1.005 -8.5501 8.715 -0.844 -8.5822 9.869 -1.287 -8.4941
  [3,16,8.687,-1.005,-8.5501,8.715,-0.844,-8.5822,9.869,-1.287,-8.4941],
// 3 16 10.847 -1.662 -8.4195 10.985 -1.715 -8.4089 10.898 -1.854 -8.3813
  [3,16,10.847,-1.662,-8.4195,10.985,-1.715,-8.4089,10.898,-1.854,-8.3813],
// 4 16 9.676 -1.557 -8.4404 8.6 -1.144 -8.5225 8.687 -1.005 -8.5501 9.869 -1.287 -8.4941
  [4,16,9.676,-1.557,-8.4404,8.6,-1.144,-8.5225,8.687,-1.005,-8.5501,9.869,-1.287,-8.4941],
// 3 16 12.223 0.821 -8.5867 12.639 0.519 -8.6468 12.518 0.408 -8.6689
  [3,16,12.223,0.821,-8.5867,12.639,0.519,-8.6468,12.518,0.408,-8.6689],
// 4 16 11.41 1.015 -8.5482 10.483 1.689 -8.4141 10.603 1.8 -8.392 11.605 1.27 -8.4974
  [4,16,11.41,1.015,-8.5482,10.483,1.689,-8.4141,10.603,1.8,-8.392,11.605,1.27,-8.4974],
// 3 16 2 -3.349 -8.084 8.011 -3.349 -8.084 7.64 -3.71 -7.8427
  [3,16,2,-3.349,-8.084,8.011,-3.349,-8.084,7.64,-3.71,-7.8427],
// 3 16 2 -3.349 -8.084 7.64 -3.71 -7.8427 7.53 -3.855 -7.7458
  [3,16,2,-3.349,-8.084,7.64,-3.71,-7.8427,7.53,-3.855,-7.7458],
// 4 16 2 -6.187 -6.187 2 -3.349 -8.084 7.53 -3.855 -7.7458 7.572 -4.032 -7.6275
  [4,16,2,-6.187,-6.187,2,-3.349,-8.084,7.53,-3.855,-7.7458,7.572,-4.032,-7.6275],
// 4 16 2 -6.187 -6.187 7.572 -4.032 -7.6275 7.84 -4.04 -7.6221 18.337 -6.187 -6.187
  [4,16,2,-6.187,-6.187,7.572,-4.032,-7.6275,7.84,-4.04,-7.6221,18.337,-6.187,-6.187],
// 4 16 18.433 -3.349 -8.084 18.337 -6.187 -6.187 7.84 -4.04 -7.6221 8.448 -3.741 -7.822
  [4,16,18.433,-3.349,-8.084,18.337,-6.187,-6.187,7.84,-4.04,-7.6221,8.448,-3.741,-7.822],
// 3 16 9.091 -3.349 -8.084 18.433 -3.349 -8.084 8.448 -3.741 -7.822
  [3,16,9.091,-3.349,-8.084,18.433,-3.349,-8.084,8.448,-3.741,-7.822],
// 3 16 9.792 -2.837 -8.1858 10.055 -2.566 -8.2397 11.454 -3.102 -8.1331
  [3,16,9.792,-2.837,-8.1858,10.055,-2.566,-8.2397,11.454,-3.102,-8.1331],
// 4 16 11.825 -3.166 -8.1204 9.091 -3.349 -8.084 9.792 -2.837 -8.1858 11.454 -3.102 -8.1331
  [4,16,11.825,-3.166,-8.1204,9.091,-3.349,-8.084,9.792,-2.837,-8.1858,11.454,-3.102,-8.1331],
// 3 16 11.825 -3.166 -8.1204 18.433 -3.349 -8.084 9.091 -3.349 -8.084
  [3,16,11.825,-3.166,-8.1204,18.433,-3.349,-8.084,9.091,-3.349,-8.084],
// 3 16 11.825 -3.166 -8.1204 12.193 -3.082 -8.1371 18.433 -3.349 -8.084
  [3,16,11.825,-3.166,-8.1204,12.193,-3.082,-8.1371,18.433,-3.349,-8.084],
// 3 16 12.193 -3.082 -8.1371 12.501 -2.865 -8.1803 18.433 -3.349 -8.084
  [3,16,12.193,-3.082,-8.1371,12.501,-2.865,-8.1803,18.433,-3.349,-8.084],
// 3 16 12.501 -2.865 -8.1803 12.702 -2.546 -8.2437 18.433 -3.349 -8.084
  [3,16,12.501,-2.865,-8.1803,12.702,-2.546,-8.2437,18.433,-3.349,-8.084],
// 4 16 13.451 -1.114 -8.5285 18.433 -3.349 -8.084 12.702 -2.546 -8.2437 12.766 -2.175 -8.3175
  [4,16,13.451,-1.114,-8.5285,18.433,-3.349,-8.084,12.702,-2.546,-8.2437,12.766,-2.175,-8.3175],
// 4 16 11.324 -0.982 -8.5547 11.72 -0.201 -8.71 12.732 -0.942 -8.5627 12.146 -1.298 -8.4919
  [4,16,11.324,-0.982,-8.5547,11.72,-0.201,-8.71,12.732,-0.942,-8.5627,12.146,-1.298,-8.4919],
// 3 16 12.146 -1.298 -8.4919 12.732 -0.942 -8.5627 12.465 -1.499 -8.4519
  [3,16,12.146,-1.298,-8.4919,12.732,-0.942,-8.5627,12.465,-1.499,-8.4519],
// 4 16 12.465 -1.499 -8.4519 12.732 -0.942 -8.5627 13.074 -1.099 -8.5314 12.682 -1.807 -8.3907
  [4,16,12.465,-1.499,-8.4519,12.732,-0.942,-8.5627,13.074,-1.099,-8.5314,12.682,-1.807,-8.3907],
// 4 16 12.682 -1.807 -8.3907 13.074 -1.099 -8.5314 13.451 -1.114 -8.5285 12.766 -2.175 -8.3175
  [4,16,12.682,-1.807,-8.3907,13.074,-1.099,-8.5314,13.451,-1.114,-8.5285,12.766,-2.175,-8.3175],
// 3 16 13.451 -1.114 -8.5285 13.805 -0.984 -8.5543 18.433 -3.349 -8.084
  [3,16,13.451,-1.114,-8.5285,13.805,-0.984,-8.5543,18.433,-3.349,-8.084],
// 3 16 13.805 -0.984 -8.5543 14.082 -0.728 -8.6052 18.433 -3.349 -8.084
  [3,16,13.805,-0.984,-8.5543,14.082,-0.728,-8.6052,18.433,-3.349,-8.084],
// 4 16 18.546 0 -8.75 18.433 -3.349 -8.084 14.082 -0.728 -8.6052 14.239 -0.386 -8.6732
  [4,16,18.546,0,-8.75,18.433,-3.349,-8.084,14.082,-0.728,-8.6052,14.239,-0.386,-8.6732],
// 3 16 14.254 0 -8.75 18.546 0 -8.75 14.239 -0.386 -8.6732
  [3,16,14.254,0,-8.75,18.546,0,-8.75,14.239,-0.386,-8.6732],
// 3 16 8.769 0 -8.75 10.71 0 -8.75 10.314 -0.594 -8.6319
  [3,16,8.769,0,-8.75,10.71,0,-8.75,10.314,-0.594,-8.6319],
// 4 16 8.492 -2.878 -8.1777 7.439 -1.561 -8.4396 9.122 -2.209 -8.3107 8.893 -2.461 -8.2606
  [4,16,8.492,-2.878,-8.1777,7.439,-1.561,-8.4396,9.122,-2.209,-8.3107,8.893,-2.461,-8.2606],
// 4 16 2 -3.349 -8.084 7.439 -1.561 -8.4396 8.492 -2.878 -8.1777 8.011 -3.349 -8.084
  [4,16,2,-3.349,-8.084,7.439,-1.561,-8.4396,8.492,-2.878,-8.1777,8.011,-3.349,-8.084],
// 3 16 7.121 -1.36 -8.4795 7.439 -1.561 -8.4396 2 -3.349 -8.084
  [3,16,7.121,-1.36,-8.4795,7.439,-1.561,-8.4396,2,-3.349,-8.084],
// 3 16 6.903 -1.052 -8.5408 7.121 -1.36 -8.4795 2 -3.349 -8.084
  [3,16,6.903,-1.052,-8.5408,7.121,-1.36,-8.4795,2,-3.349,-8.084],
// 4 16 2 0 -8.75 6.82 -0.684 -8.614 6.903 -1.052 -8.5408 2 -3.349 -8.084
  [4,16,2,0,-8.75,6.82,-0.684,-8.614,6.903,-1.052,-8.5408,2,-3.349,-8.084],
// 3 16 2 0 -8.75 6.884 -0.313 -8.6878 6.82 -0.684 -8.614
  [3,16,2,0,-8.75,6.884,-0.313,-8.6878,6.82,-0.684,-8.614],
// 3 16 2 0 -8.75 7.085 0 -8.75 6.884 -0.313 -8.6878
  [3,16,2,0,-8.75,7.085,0,-8.75,6.884,-0.313,-8.6878],
// 4 16 2 3.349 -8.084 7.393 0.223 -8.7057 7.085 0 -8.75 2 0 -8.75
  [4,16,2,3.349,-8.084,7.393,0.223,-8.7057,7.085,0,-8.75,2,0,-8.75],
// 4 16 8.769 0 -8.75 9.253 1.586 -8.4346 10.948 0.359 -8.6786 10.71 0 -8.75
  [4,16,8.769,0,-8.75,9.253,1.586,-8.4346,10.948,0.359,-8.6786,10.71,0,-8.75],
// 4 16 8.132 0.243 -8.7017 8.998 1.863 -8.3795 9.253 1.586 -8.4346 8.769 0 -8.75
  [4,16,8.132,0.243,-8.7017,8.998,1.863,-8.3795,9.253,1.586,-8.4346,8.769,0,-8.75],
// 4 16 7.76 0.307 -8.6889 8.867 2.216 -8.3093 8.998 1.863 -8.3795 8.132 0.243 -8.7017
  [4,16,7.76,0.307,-8.6889,8.867,2.216,-8.3093,8.998,1.863,-8.3795,8.132,0.243,-8.7017],
// 4 16 7.393 0.223 -8.7057 8.882 2.593 -8.2343 8.867 2.216 -8.3093 7.76 0.307 -8.6889
  [4,16,7.393,0.223,-8.7057,8.882,2.593,-8.2343,8.867,2.216,-8.3093,7.76,0.307,-8.6889],
// 4 16 9.04 2.935 -8.1663 8.882 2.593 -8.2343 7.393 0.223 -8.7057 2 3.349 -8.084
  [4,16,9.04,2.935,-8.1663,8.882,2.593,-8.2343,7.393,0.223,-8.7057,2,3.349,-8.084],
// 3 16 2 3.349 -8.084 9.316 3.191 -8.1154 9.04 2.935 -8.1663
  [3,16,2,3.349,-8.084,9.316,3.191,-8.1154,9.04,2.935,-8.1663],
// 3 16 2 3.349 -8.084 9.67 3.322 -8.0894 9.316 3.191 -8.1154
  [3,16,2,3.349,-8.084,9.67,3.322,-8.0894,9.316,3.191,-8.1154],
// 3 16 9.67 3.322 -8.0894 18.659 3.349 -8.084 10.047 3.307 -8.0924
  [3,16,9.67,3.322,-8.0894,18.659,3.349,-8.084,10.047,3.307,-8.0924],
// 3 16 2 3.349 -8.084 18.659 3.349 -8.084 9.67 3.322 -8.0894
  [3,16,2,3.349,-8.084,18.659,3.349,-8.084,9.67,3.322,-8.0894],
// 4 16 18.546 0 -8.75 13.91 2.88 -8.1773 13.879 2.949 -8.1635 18.659 3.349 -8.084
  [4,16,18.546,0,-8.75,13.91,2.88,-8.1773,13.879,2.949,-8.1635,18.659,3.349,-8.084],
// 4 16 10.389 3.149 -8.1238 10.047 3.307 -8.0924 18.659 3.349 -8.084 13.879 2.949 -8.1635
  [4,16,10.389,3.149,-8.1238,10.047,3.307,-8.0924,18.659,3.349,-8.084,13.879,2.949,-8.1635],
// 3 16 10.389 3.149 -8.1238 12.571 2.222 -8.3081 12.188 1.842 -8.3837
  [3,16,10.389,3.149,-8.1238,12.571,2.222,-8.3081,12.188,1.842,-8.3837],
// 3 16 10.389 3.149 -8.1238 13.307 2.728 -8.2075 12.571 2.222 -8.3081
  [3,16,10.389,3.149,-8.1238,13.307,2.728,-8.2075,12.571,2.222,-8.3081],
// 3 16 10.389 3.149 -8.1238 13.879 2.949 -8.1635 13.307 2.728 -8.2075
  [3,16,10.389,3.149,-8.1238,13.879,2.949,-8.1635,13.307,2.728,-8.2075],
// 3 16 14.124 0.345 -8.6814 18.546 0 -8.75 14.254 0 -8.75
  [3,16,14.124,0.345,-8.6814,18.546,0,-8.75,14.254,0,-8.75],
// 4 16 13.103 2.056 -8.3411 18.546 0 -8.75 14.124 0.345 -8.6814 13.868 0.622 -8.6263
  [4,16,13.103,2.056,-8.3411,18.546,0,-8.75,14.124,0.345,-8.6814,13.868,0.622,-8.6263],
// 3 16 12.66 1.499 -8.4519 13.103 2.056 -8.3411 13.868 0.622 -8.6263
  [3,16,12.66,1.499,-8.4519,13.103,2.056,-8.3411,13.868,0.622,-8.6263],
// 4 16 13.103 2.056 -8.3411 13.502 2.479 -8.257 13.91 2.88 -8.1773 18.546 0 -8.75
  [4,16,13.103,2.056,-8.3411,13.502,2.479,-8.257,13.91,2.88,-8.1773,18.546,0,-8.75],
// 4 16 2 3.349 -8.084 2 6.187 -6.187 18.755 6.187 -6.187 18.659 3.349 -8.084
  [4,16,2,3.349,-8.084,2,6.187,-6.187,18.755,6.187,-6.187,18.659,3.349,-8.084],
// 4 16 19.23 20 -4 18.804 7.399 -4 2 7.399 -4 2 7.657 -4
  [4,16,19.23,20,-4,18.804,7.399,-4,2,7.399,-4,2,7.657,-4],
// 4 16 2 6.187 -6.187 2 7.399 -4 18.804 7.399 -4 18.755 6.187 -6.187
  [4,16,2,6.187,-6.187,2,7.399,-4,18.804,7.399,-4,18.755,6.187,-6.187],
// 4 16 19.23 20 -4 2 7.657 -4 1.5 7.657 -4 1.5 20 -4
  [4,16,19.23,20,-4,2,7.657,-4,1.5,7.657,-4,1.5,20,-4],
];
module ldraw_lib__3817bpc44(step=0, col=false, unit=2/5, alt=false, line=0.2, solid=!$preview)
    makepoly(ldraw_lib__3817bpc44(), step=step, col=col, unit=unit, alt=alt, line=line, solid=solid);
ldraw_lib__3817bpc44(line=0.2);
